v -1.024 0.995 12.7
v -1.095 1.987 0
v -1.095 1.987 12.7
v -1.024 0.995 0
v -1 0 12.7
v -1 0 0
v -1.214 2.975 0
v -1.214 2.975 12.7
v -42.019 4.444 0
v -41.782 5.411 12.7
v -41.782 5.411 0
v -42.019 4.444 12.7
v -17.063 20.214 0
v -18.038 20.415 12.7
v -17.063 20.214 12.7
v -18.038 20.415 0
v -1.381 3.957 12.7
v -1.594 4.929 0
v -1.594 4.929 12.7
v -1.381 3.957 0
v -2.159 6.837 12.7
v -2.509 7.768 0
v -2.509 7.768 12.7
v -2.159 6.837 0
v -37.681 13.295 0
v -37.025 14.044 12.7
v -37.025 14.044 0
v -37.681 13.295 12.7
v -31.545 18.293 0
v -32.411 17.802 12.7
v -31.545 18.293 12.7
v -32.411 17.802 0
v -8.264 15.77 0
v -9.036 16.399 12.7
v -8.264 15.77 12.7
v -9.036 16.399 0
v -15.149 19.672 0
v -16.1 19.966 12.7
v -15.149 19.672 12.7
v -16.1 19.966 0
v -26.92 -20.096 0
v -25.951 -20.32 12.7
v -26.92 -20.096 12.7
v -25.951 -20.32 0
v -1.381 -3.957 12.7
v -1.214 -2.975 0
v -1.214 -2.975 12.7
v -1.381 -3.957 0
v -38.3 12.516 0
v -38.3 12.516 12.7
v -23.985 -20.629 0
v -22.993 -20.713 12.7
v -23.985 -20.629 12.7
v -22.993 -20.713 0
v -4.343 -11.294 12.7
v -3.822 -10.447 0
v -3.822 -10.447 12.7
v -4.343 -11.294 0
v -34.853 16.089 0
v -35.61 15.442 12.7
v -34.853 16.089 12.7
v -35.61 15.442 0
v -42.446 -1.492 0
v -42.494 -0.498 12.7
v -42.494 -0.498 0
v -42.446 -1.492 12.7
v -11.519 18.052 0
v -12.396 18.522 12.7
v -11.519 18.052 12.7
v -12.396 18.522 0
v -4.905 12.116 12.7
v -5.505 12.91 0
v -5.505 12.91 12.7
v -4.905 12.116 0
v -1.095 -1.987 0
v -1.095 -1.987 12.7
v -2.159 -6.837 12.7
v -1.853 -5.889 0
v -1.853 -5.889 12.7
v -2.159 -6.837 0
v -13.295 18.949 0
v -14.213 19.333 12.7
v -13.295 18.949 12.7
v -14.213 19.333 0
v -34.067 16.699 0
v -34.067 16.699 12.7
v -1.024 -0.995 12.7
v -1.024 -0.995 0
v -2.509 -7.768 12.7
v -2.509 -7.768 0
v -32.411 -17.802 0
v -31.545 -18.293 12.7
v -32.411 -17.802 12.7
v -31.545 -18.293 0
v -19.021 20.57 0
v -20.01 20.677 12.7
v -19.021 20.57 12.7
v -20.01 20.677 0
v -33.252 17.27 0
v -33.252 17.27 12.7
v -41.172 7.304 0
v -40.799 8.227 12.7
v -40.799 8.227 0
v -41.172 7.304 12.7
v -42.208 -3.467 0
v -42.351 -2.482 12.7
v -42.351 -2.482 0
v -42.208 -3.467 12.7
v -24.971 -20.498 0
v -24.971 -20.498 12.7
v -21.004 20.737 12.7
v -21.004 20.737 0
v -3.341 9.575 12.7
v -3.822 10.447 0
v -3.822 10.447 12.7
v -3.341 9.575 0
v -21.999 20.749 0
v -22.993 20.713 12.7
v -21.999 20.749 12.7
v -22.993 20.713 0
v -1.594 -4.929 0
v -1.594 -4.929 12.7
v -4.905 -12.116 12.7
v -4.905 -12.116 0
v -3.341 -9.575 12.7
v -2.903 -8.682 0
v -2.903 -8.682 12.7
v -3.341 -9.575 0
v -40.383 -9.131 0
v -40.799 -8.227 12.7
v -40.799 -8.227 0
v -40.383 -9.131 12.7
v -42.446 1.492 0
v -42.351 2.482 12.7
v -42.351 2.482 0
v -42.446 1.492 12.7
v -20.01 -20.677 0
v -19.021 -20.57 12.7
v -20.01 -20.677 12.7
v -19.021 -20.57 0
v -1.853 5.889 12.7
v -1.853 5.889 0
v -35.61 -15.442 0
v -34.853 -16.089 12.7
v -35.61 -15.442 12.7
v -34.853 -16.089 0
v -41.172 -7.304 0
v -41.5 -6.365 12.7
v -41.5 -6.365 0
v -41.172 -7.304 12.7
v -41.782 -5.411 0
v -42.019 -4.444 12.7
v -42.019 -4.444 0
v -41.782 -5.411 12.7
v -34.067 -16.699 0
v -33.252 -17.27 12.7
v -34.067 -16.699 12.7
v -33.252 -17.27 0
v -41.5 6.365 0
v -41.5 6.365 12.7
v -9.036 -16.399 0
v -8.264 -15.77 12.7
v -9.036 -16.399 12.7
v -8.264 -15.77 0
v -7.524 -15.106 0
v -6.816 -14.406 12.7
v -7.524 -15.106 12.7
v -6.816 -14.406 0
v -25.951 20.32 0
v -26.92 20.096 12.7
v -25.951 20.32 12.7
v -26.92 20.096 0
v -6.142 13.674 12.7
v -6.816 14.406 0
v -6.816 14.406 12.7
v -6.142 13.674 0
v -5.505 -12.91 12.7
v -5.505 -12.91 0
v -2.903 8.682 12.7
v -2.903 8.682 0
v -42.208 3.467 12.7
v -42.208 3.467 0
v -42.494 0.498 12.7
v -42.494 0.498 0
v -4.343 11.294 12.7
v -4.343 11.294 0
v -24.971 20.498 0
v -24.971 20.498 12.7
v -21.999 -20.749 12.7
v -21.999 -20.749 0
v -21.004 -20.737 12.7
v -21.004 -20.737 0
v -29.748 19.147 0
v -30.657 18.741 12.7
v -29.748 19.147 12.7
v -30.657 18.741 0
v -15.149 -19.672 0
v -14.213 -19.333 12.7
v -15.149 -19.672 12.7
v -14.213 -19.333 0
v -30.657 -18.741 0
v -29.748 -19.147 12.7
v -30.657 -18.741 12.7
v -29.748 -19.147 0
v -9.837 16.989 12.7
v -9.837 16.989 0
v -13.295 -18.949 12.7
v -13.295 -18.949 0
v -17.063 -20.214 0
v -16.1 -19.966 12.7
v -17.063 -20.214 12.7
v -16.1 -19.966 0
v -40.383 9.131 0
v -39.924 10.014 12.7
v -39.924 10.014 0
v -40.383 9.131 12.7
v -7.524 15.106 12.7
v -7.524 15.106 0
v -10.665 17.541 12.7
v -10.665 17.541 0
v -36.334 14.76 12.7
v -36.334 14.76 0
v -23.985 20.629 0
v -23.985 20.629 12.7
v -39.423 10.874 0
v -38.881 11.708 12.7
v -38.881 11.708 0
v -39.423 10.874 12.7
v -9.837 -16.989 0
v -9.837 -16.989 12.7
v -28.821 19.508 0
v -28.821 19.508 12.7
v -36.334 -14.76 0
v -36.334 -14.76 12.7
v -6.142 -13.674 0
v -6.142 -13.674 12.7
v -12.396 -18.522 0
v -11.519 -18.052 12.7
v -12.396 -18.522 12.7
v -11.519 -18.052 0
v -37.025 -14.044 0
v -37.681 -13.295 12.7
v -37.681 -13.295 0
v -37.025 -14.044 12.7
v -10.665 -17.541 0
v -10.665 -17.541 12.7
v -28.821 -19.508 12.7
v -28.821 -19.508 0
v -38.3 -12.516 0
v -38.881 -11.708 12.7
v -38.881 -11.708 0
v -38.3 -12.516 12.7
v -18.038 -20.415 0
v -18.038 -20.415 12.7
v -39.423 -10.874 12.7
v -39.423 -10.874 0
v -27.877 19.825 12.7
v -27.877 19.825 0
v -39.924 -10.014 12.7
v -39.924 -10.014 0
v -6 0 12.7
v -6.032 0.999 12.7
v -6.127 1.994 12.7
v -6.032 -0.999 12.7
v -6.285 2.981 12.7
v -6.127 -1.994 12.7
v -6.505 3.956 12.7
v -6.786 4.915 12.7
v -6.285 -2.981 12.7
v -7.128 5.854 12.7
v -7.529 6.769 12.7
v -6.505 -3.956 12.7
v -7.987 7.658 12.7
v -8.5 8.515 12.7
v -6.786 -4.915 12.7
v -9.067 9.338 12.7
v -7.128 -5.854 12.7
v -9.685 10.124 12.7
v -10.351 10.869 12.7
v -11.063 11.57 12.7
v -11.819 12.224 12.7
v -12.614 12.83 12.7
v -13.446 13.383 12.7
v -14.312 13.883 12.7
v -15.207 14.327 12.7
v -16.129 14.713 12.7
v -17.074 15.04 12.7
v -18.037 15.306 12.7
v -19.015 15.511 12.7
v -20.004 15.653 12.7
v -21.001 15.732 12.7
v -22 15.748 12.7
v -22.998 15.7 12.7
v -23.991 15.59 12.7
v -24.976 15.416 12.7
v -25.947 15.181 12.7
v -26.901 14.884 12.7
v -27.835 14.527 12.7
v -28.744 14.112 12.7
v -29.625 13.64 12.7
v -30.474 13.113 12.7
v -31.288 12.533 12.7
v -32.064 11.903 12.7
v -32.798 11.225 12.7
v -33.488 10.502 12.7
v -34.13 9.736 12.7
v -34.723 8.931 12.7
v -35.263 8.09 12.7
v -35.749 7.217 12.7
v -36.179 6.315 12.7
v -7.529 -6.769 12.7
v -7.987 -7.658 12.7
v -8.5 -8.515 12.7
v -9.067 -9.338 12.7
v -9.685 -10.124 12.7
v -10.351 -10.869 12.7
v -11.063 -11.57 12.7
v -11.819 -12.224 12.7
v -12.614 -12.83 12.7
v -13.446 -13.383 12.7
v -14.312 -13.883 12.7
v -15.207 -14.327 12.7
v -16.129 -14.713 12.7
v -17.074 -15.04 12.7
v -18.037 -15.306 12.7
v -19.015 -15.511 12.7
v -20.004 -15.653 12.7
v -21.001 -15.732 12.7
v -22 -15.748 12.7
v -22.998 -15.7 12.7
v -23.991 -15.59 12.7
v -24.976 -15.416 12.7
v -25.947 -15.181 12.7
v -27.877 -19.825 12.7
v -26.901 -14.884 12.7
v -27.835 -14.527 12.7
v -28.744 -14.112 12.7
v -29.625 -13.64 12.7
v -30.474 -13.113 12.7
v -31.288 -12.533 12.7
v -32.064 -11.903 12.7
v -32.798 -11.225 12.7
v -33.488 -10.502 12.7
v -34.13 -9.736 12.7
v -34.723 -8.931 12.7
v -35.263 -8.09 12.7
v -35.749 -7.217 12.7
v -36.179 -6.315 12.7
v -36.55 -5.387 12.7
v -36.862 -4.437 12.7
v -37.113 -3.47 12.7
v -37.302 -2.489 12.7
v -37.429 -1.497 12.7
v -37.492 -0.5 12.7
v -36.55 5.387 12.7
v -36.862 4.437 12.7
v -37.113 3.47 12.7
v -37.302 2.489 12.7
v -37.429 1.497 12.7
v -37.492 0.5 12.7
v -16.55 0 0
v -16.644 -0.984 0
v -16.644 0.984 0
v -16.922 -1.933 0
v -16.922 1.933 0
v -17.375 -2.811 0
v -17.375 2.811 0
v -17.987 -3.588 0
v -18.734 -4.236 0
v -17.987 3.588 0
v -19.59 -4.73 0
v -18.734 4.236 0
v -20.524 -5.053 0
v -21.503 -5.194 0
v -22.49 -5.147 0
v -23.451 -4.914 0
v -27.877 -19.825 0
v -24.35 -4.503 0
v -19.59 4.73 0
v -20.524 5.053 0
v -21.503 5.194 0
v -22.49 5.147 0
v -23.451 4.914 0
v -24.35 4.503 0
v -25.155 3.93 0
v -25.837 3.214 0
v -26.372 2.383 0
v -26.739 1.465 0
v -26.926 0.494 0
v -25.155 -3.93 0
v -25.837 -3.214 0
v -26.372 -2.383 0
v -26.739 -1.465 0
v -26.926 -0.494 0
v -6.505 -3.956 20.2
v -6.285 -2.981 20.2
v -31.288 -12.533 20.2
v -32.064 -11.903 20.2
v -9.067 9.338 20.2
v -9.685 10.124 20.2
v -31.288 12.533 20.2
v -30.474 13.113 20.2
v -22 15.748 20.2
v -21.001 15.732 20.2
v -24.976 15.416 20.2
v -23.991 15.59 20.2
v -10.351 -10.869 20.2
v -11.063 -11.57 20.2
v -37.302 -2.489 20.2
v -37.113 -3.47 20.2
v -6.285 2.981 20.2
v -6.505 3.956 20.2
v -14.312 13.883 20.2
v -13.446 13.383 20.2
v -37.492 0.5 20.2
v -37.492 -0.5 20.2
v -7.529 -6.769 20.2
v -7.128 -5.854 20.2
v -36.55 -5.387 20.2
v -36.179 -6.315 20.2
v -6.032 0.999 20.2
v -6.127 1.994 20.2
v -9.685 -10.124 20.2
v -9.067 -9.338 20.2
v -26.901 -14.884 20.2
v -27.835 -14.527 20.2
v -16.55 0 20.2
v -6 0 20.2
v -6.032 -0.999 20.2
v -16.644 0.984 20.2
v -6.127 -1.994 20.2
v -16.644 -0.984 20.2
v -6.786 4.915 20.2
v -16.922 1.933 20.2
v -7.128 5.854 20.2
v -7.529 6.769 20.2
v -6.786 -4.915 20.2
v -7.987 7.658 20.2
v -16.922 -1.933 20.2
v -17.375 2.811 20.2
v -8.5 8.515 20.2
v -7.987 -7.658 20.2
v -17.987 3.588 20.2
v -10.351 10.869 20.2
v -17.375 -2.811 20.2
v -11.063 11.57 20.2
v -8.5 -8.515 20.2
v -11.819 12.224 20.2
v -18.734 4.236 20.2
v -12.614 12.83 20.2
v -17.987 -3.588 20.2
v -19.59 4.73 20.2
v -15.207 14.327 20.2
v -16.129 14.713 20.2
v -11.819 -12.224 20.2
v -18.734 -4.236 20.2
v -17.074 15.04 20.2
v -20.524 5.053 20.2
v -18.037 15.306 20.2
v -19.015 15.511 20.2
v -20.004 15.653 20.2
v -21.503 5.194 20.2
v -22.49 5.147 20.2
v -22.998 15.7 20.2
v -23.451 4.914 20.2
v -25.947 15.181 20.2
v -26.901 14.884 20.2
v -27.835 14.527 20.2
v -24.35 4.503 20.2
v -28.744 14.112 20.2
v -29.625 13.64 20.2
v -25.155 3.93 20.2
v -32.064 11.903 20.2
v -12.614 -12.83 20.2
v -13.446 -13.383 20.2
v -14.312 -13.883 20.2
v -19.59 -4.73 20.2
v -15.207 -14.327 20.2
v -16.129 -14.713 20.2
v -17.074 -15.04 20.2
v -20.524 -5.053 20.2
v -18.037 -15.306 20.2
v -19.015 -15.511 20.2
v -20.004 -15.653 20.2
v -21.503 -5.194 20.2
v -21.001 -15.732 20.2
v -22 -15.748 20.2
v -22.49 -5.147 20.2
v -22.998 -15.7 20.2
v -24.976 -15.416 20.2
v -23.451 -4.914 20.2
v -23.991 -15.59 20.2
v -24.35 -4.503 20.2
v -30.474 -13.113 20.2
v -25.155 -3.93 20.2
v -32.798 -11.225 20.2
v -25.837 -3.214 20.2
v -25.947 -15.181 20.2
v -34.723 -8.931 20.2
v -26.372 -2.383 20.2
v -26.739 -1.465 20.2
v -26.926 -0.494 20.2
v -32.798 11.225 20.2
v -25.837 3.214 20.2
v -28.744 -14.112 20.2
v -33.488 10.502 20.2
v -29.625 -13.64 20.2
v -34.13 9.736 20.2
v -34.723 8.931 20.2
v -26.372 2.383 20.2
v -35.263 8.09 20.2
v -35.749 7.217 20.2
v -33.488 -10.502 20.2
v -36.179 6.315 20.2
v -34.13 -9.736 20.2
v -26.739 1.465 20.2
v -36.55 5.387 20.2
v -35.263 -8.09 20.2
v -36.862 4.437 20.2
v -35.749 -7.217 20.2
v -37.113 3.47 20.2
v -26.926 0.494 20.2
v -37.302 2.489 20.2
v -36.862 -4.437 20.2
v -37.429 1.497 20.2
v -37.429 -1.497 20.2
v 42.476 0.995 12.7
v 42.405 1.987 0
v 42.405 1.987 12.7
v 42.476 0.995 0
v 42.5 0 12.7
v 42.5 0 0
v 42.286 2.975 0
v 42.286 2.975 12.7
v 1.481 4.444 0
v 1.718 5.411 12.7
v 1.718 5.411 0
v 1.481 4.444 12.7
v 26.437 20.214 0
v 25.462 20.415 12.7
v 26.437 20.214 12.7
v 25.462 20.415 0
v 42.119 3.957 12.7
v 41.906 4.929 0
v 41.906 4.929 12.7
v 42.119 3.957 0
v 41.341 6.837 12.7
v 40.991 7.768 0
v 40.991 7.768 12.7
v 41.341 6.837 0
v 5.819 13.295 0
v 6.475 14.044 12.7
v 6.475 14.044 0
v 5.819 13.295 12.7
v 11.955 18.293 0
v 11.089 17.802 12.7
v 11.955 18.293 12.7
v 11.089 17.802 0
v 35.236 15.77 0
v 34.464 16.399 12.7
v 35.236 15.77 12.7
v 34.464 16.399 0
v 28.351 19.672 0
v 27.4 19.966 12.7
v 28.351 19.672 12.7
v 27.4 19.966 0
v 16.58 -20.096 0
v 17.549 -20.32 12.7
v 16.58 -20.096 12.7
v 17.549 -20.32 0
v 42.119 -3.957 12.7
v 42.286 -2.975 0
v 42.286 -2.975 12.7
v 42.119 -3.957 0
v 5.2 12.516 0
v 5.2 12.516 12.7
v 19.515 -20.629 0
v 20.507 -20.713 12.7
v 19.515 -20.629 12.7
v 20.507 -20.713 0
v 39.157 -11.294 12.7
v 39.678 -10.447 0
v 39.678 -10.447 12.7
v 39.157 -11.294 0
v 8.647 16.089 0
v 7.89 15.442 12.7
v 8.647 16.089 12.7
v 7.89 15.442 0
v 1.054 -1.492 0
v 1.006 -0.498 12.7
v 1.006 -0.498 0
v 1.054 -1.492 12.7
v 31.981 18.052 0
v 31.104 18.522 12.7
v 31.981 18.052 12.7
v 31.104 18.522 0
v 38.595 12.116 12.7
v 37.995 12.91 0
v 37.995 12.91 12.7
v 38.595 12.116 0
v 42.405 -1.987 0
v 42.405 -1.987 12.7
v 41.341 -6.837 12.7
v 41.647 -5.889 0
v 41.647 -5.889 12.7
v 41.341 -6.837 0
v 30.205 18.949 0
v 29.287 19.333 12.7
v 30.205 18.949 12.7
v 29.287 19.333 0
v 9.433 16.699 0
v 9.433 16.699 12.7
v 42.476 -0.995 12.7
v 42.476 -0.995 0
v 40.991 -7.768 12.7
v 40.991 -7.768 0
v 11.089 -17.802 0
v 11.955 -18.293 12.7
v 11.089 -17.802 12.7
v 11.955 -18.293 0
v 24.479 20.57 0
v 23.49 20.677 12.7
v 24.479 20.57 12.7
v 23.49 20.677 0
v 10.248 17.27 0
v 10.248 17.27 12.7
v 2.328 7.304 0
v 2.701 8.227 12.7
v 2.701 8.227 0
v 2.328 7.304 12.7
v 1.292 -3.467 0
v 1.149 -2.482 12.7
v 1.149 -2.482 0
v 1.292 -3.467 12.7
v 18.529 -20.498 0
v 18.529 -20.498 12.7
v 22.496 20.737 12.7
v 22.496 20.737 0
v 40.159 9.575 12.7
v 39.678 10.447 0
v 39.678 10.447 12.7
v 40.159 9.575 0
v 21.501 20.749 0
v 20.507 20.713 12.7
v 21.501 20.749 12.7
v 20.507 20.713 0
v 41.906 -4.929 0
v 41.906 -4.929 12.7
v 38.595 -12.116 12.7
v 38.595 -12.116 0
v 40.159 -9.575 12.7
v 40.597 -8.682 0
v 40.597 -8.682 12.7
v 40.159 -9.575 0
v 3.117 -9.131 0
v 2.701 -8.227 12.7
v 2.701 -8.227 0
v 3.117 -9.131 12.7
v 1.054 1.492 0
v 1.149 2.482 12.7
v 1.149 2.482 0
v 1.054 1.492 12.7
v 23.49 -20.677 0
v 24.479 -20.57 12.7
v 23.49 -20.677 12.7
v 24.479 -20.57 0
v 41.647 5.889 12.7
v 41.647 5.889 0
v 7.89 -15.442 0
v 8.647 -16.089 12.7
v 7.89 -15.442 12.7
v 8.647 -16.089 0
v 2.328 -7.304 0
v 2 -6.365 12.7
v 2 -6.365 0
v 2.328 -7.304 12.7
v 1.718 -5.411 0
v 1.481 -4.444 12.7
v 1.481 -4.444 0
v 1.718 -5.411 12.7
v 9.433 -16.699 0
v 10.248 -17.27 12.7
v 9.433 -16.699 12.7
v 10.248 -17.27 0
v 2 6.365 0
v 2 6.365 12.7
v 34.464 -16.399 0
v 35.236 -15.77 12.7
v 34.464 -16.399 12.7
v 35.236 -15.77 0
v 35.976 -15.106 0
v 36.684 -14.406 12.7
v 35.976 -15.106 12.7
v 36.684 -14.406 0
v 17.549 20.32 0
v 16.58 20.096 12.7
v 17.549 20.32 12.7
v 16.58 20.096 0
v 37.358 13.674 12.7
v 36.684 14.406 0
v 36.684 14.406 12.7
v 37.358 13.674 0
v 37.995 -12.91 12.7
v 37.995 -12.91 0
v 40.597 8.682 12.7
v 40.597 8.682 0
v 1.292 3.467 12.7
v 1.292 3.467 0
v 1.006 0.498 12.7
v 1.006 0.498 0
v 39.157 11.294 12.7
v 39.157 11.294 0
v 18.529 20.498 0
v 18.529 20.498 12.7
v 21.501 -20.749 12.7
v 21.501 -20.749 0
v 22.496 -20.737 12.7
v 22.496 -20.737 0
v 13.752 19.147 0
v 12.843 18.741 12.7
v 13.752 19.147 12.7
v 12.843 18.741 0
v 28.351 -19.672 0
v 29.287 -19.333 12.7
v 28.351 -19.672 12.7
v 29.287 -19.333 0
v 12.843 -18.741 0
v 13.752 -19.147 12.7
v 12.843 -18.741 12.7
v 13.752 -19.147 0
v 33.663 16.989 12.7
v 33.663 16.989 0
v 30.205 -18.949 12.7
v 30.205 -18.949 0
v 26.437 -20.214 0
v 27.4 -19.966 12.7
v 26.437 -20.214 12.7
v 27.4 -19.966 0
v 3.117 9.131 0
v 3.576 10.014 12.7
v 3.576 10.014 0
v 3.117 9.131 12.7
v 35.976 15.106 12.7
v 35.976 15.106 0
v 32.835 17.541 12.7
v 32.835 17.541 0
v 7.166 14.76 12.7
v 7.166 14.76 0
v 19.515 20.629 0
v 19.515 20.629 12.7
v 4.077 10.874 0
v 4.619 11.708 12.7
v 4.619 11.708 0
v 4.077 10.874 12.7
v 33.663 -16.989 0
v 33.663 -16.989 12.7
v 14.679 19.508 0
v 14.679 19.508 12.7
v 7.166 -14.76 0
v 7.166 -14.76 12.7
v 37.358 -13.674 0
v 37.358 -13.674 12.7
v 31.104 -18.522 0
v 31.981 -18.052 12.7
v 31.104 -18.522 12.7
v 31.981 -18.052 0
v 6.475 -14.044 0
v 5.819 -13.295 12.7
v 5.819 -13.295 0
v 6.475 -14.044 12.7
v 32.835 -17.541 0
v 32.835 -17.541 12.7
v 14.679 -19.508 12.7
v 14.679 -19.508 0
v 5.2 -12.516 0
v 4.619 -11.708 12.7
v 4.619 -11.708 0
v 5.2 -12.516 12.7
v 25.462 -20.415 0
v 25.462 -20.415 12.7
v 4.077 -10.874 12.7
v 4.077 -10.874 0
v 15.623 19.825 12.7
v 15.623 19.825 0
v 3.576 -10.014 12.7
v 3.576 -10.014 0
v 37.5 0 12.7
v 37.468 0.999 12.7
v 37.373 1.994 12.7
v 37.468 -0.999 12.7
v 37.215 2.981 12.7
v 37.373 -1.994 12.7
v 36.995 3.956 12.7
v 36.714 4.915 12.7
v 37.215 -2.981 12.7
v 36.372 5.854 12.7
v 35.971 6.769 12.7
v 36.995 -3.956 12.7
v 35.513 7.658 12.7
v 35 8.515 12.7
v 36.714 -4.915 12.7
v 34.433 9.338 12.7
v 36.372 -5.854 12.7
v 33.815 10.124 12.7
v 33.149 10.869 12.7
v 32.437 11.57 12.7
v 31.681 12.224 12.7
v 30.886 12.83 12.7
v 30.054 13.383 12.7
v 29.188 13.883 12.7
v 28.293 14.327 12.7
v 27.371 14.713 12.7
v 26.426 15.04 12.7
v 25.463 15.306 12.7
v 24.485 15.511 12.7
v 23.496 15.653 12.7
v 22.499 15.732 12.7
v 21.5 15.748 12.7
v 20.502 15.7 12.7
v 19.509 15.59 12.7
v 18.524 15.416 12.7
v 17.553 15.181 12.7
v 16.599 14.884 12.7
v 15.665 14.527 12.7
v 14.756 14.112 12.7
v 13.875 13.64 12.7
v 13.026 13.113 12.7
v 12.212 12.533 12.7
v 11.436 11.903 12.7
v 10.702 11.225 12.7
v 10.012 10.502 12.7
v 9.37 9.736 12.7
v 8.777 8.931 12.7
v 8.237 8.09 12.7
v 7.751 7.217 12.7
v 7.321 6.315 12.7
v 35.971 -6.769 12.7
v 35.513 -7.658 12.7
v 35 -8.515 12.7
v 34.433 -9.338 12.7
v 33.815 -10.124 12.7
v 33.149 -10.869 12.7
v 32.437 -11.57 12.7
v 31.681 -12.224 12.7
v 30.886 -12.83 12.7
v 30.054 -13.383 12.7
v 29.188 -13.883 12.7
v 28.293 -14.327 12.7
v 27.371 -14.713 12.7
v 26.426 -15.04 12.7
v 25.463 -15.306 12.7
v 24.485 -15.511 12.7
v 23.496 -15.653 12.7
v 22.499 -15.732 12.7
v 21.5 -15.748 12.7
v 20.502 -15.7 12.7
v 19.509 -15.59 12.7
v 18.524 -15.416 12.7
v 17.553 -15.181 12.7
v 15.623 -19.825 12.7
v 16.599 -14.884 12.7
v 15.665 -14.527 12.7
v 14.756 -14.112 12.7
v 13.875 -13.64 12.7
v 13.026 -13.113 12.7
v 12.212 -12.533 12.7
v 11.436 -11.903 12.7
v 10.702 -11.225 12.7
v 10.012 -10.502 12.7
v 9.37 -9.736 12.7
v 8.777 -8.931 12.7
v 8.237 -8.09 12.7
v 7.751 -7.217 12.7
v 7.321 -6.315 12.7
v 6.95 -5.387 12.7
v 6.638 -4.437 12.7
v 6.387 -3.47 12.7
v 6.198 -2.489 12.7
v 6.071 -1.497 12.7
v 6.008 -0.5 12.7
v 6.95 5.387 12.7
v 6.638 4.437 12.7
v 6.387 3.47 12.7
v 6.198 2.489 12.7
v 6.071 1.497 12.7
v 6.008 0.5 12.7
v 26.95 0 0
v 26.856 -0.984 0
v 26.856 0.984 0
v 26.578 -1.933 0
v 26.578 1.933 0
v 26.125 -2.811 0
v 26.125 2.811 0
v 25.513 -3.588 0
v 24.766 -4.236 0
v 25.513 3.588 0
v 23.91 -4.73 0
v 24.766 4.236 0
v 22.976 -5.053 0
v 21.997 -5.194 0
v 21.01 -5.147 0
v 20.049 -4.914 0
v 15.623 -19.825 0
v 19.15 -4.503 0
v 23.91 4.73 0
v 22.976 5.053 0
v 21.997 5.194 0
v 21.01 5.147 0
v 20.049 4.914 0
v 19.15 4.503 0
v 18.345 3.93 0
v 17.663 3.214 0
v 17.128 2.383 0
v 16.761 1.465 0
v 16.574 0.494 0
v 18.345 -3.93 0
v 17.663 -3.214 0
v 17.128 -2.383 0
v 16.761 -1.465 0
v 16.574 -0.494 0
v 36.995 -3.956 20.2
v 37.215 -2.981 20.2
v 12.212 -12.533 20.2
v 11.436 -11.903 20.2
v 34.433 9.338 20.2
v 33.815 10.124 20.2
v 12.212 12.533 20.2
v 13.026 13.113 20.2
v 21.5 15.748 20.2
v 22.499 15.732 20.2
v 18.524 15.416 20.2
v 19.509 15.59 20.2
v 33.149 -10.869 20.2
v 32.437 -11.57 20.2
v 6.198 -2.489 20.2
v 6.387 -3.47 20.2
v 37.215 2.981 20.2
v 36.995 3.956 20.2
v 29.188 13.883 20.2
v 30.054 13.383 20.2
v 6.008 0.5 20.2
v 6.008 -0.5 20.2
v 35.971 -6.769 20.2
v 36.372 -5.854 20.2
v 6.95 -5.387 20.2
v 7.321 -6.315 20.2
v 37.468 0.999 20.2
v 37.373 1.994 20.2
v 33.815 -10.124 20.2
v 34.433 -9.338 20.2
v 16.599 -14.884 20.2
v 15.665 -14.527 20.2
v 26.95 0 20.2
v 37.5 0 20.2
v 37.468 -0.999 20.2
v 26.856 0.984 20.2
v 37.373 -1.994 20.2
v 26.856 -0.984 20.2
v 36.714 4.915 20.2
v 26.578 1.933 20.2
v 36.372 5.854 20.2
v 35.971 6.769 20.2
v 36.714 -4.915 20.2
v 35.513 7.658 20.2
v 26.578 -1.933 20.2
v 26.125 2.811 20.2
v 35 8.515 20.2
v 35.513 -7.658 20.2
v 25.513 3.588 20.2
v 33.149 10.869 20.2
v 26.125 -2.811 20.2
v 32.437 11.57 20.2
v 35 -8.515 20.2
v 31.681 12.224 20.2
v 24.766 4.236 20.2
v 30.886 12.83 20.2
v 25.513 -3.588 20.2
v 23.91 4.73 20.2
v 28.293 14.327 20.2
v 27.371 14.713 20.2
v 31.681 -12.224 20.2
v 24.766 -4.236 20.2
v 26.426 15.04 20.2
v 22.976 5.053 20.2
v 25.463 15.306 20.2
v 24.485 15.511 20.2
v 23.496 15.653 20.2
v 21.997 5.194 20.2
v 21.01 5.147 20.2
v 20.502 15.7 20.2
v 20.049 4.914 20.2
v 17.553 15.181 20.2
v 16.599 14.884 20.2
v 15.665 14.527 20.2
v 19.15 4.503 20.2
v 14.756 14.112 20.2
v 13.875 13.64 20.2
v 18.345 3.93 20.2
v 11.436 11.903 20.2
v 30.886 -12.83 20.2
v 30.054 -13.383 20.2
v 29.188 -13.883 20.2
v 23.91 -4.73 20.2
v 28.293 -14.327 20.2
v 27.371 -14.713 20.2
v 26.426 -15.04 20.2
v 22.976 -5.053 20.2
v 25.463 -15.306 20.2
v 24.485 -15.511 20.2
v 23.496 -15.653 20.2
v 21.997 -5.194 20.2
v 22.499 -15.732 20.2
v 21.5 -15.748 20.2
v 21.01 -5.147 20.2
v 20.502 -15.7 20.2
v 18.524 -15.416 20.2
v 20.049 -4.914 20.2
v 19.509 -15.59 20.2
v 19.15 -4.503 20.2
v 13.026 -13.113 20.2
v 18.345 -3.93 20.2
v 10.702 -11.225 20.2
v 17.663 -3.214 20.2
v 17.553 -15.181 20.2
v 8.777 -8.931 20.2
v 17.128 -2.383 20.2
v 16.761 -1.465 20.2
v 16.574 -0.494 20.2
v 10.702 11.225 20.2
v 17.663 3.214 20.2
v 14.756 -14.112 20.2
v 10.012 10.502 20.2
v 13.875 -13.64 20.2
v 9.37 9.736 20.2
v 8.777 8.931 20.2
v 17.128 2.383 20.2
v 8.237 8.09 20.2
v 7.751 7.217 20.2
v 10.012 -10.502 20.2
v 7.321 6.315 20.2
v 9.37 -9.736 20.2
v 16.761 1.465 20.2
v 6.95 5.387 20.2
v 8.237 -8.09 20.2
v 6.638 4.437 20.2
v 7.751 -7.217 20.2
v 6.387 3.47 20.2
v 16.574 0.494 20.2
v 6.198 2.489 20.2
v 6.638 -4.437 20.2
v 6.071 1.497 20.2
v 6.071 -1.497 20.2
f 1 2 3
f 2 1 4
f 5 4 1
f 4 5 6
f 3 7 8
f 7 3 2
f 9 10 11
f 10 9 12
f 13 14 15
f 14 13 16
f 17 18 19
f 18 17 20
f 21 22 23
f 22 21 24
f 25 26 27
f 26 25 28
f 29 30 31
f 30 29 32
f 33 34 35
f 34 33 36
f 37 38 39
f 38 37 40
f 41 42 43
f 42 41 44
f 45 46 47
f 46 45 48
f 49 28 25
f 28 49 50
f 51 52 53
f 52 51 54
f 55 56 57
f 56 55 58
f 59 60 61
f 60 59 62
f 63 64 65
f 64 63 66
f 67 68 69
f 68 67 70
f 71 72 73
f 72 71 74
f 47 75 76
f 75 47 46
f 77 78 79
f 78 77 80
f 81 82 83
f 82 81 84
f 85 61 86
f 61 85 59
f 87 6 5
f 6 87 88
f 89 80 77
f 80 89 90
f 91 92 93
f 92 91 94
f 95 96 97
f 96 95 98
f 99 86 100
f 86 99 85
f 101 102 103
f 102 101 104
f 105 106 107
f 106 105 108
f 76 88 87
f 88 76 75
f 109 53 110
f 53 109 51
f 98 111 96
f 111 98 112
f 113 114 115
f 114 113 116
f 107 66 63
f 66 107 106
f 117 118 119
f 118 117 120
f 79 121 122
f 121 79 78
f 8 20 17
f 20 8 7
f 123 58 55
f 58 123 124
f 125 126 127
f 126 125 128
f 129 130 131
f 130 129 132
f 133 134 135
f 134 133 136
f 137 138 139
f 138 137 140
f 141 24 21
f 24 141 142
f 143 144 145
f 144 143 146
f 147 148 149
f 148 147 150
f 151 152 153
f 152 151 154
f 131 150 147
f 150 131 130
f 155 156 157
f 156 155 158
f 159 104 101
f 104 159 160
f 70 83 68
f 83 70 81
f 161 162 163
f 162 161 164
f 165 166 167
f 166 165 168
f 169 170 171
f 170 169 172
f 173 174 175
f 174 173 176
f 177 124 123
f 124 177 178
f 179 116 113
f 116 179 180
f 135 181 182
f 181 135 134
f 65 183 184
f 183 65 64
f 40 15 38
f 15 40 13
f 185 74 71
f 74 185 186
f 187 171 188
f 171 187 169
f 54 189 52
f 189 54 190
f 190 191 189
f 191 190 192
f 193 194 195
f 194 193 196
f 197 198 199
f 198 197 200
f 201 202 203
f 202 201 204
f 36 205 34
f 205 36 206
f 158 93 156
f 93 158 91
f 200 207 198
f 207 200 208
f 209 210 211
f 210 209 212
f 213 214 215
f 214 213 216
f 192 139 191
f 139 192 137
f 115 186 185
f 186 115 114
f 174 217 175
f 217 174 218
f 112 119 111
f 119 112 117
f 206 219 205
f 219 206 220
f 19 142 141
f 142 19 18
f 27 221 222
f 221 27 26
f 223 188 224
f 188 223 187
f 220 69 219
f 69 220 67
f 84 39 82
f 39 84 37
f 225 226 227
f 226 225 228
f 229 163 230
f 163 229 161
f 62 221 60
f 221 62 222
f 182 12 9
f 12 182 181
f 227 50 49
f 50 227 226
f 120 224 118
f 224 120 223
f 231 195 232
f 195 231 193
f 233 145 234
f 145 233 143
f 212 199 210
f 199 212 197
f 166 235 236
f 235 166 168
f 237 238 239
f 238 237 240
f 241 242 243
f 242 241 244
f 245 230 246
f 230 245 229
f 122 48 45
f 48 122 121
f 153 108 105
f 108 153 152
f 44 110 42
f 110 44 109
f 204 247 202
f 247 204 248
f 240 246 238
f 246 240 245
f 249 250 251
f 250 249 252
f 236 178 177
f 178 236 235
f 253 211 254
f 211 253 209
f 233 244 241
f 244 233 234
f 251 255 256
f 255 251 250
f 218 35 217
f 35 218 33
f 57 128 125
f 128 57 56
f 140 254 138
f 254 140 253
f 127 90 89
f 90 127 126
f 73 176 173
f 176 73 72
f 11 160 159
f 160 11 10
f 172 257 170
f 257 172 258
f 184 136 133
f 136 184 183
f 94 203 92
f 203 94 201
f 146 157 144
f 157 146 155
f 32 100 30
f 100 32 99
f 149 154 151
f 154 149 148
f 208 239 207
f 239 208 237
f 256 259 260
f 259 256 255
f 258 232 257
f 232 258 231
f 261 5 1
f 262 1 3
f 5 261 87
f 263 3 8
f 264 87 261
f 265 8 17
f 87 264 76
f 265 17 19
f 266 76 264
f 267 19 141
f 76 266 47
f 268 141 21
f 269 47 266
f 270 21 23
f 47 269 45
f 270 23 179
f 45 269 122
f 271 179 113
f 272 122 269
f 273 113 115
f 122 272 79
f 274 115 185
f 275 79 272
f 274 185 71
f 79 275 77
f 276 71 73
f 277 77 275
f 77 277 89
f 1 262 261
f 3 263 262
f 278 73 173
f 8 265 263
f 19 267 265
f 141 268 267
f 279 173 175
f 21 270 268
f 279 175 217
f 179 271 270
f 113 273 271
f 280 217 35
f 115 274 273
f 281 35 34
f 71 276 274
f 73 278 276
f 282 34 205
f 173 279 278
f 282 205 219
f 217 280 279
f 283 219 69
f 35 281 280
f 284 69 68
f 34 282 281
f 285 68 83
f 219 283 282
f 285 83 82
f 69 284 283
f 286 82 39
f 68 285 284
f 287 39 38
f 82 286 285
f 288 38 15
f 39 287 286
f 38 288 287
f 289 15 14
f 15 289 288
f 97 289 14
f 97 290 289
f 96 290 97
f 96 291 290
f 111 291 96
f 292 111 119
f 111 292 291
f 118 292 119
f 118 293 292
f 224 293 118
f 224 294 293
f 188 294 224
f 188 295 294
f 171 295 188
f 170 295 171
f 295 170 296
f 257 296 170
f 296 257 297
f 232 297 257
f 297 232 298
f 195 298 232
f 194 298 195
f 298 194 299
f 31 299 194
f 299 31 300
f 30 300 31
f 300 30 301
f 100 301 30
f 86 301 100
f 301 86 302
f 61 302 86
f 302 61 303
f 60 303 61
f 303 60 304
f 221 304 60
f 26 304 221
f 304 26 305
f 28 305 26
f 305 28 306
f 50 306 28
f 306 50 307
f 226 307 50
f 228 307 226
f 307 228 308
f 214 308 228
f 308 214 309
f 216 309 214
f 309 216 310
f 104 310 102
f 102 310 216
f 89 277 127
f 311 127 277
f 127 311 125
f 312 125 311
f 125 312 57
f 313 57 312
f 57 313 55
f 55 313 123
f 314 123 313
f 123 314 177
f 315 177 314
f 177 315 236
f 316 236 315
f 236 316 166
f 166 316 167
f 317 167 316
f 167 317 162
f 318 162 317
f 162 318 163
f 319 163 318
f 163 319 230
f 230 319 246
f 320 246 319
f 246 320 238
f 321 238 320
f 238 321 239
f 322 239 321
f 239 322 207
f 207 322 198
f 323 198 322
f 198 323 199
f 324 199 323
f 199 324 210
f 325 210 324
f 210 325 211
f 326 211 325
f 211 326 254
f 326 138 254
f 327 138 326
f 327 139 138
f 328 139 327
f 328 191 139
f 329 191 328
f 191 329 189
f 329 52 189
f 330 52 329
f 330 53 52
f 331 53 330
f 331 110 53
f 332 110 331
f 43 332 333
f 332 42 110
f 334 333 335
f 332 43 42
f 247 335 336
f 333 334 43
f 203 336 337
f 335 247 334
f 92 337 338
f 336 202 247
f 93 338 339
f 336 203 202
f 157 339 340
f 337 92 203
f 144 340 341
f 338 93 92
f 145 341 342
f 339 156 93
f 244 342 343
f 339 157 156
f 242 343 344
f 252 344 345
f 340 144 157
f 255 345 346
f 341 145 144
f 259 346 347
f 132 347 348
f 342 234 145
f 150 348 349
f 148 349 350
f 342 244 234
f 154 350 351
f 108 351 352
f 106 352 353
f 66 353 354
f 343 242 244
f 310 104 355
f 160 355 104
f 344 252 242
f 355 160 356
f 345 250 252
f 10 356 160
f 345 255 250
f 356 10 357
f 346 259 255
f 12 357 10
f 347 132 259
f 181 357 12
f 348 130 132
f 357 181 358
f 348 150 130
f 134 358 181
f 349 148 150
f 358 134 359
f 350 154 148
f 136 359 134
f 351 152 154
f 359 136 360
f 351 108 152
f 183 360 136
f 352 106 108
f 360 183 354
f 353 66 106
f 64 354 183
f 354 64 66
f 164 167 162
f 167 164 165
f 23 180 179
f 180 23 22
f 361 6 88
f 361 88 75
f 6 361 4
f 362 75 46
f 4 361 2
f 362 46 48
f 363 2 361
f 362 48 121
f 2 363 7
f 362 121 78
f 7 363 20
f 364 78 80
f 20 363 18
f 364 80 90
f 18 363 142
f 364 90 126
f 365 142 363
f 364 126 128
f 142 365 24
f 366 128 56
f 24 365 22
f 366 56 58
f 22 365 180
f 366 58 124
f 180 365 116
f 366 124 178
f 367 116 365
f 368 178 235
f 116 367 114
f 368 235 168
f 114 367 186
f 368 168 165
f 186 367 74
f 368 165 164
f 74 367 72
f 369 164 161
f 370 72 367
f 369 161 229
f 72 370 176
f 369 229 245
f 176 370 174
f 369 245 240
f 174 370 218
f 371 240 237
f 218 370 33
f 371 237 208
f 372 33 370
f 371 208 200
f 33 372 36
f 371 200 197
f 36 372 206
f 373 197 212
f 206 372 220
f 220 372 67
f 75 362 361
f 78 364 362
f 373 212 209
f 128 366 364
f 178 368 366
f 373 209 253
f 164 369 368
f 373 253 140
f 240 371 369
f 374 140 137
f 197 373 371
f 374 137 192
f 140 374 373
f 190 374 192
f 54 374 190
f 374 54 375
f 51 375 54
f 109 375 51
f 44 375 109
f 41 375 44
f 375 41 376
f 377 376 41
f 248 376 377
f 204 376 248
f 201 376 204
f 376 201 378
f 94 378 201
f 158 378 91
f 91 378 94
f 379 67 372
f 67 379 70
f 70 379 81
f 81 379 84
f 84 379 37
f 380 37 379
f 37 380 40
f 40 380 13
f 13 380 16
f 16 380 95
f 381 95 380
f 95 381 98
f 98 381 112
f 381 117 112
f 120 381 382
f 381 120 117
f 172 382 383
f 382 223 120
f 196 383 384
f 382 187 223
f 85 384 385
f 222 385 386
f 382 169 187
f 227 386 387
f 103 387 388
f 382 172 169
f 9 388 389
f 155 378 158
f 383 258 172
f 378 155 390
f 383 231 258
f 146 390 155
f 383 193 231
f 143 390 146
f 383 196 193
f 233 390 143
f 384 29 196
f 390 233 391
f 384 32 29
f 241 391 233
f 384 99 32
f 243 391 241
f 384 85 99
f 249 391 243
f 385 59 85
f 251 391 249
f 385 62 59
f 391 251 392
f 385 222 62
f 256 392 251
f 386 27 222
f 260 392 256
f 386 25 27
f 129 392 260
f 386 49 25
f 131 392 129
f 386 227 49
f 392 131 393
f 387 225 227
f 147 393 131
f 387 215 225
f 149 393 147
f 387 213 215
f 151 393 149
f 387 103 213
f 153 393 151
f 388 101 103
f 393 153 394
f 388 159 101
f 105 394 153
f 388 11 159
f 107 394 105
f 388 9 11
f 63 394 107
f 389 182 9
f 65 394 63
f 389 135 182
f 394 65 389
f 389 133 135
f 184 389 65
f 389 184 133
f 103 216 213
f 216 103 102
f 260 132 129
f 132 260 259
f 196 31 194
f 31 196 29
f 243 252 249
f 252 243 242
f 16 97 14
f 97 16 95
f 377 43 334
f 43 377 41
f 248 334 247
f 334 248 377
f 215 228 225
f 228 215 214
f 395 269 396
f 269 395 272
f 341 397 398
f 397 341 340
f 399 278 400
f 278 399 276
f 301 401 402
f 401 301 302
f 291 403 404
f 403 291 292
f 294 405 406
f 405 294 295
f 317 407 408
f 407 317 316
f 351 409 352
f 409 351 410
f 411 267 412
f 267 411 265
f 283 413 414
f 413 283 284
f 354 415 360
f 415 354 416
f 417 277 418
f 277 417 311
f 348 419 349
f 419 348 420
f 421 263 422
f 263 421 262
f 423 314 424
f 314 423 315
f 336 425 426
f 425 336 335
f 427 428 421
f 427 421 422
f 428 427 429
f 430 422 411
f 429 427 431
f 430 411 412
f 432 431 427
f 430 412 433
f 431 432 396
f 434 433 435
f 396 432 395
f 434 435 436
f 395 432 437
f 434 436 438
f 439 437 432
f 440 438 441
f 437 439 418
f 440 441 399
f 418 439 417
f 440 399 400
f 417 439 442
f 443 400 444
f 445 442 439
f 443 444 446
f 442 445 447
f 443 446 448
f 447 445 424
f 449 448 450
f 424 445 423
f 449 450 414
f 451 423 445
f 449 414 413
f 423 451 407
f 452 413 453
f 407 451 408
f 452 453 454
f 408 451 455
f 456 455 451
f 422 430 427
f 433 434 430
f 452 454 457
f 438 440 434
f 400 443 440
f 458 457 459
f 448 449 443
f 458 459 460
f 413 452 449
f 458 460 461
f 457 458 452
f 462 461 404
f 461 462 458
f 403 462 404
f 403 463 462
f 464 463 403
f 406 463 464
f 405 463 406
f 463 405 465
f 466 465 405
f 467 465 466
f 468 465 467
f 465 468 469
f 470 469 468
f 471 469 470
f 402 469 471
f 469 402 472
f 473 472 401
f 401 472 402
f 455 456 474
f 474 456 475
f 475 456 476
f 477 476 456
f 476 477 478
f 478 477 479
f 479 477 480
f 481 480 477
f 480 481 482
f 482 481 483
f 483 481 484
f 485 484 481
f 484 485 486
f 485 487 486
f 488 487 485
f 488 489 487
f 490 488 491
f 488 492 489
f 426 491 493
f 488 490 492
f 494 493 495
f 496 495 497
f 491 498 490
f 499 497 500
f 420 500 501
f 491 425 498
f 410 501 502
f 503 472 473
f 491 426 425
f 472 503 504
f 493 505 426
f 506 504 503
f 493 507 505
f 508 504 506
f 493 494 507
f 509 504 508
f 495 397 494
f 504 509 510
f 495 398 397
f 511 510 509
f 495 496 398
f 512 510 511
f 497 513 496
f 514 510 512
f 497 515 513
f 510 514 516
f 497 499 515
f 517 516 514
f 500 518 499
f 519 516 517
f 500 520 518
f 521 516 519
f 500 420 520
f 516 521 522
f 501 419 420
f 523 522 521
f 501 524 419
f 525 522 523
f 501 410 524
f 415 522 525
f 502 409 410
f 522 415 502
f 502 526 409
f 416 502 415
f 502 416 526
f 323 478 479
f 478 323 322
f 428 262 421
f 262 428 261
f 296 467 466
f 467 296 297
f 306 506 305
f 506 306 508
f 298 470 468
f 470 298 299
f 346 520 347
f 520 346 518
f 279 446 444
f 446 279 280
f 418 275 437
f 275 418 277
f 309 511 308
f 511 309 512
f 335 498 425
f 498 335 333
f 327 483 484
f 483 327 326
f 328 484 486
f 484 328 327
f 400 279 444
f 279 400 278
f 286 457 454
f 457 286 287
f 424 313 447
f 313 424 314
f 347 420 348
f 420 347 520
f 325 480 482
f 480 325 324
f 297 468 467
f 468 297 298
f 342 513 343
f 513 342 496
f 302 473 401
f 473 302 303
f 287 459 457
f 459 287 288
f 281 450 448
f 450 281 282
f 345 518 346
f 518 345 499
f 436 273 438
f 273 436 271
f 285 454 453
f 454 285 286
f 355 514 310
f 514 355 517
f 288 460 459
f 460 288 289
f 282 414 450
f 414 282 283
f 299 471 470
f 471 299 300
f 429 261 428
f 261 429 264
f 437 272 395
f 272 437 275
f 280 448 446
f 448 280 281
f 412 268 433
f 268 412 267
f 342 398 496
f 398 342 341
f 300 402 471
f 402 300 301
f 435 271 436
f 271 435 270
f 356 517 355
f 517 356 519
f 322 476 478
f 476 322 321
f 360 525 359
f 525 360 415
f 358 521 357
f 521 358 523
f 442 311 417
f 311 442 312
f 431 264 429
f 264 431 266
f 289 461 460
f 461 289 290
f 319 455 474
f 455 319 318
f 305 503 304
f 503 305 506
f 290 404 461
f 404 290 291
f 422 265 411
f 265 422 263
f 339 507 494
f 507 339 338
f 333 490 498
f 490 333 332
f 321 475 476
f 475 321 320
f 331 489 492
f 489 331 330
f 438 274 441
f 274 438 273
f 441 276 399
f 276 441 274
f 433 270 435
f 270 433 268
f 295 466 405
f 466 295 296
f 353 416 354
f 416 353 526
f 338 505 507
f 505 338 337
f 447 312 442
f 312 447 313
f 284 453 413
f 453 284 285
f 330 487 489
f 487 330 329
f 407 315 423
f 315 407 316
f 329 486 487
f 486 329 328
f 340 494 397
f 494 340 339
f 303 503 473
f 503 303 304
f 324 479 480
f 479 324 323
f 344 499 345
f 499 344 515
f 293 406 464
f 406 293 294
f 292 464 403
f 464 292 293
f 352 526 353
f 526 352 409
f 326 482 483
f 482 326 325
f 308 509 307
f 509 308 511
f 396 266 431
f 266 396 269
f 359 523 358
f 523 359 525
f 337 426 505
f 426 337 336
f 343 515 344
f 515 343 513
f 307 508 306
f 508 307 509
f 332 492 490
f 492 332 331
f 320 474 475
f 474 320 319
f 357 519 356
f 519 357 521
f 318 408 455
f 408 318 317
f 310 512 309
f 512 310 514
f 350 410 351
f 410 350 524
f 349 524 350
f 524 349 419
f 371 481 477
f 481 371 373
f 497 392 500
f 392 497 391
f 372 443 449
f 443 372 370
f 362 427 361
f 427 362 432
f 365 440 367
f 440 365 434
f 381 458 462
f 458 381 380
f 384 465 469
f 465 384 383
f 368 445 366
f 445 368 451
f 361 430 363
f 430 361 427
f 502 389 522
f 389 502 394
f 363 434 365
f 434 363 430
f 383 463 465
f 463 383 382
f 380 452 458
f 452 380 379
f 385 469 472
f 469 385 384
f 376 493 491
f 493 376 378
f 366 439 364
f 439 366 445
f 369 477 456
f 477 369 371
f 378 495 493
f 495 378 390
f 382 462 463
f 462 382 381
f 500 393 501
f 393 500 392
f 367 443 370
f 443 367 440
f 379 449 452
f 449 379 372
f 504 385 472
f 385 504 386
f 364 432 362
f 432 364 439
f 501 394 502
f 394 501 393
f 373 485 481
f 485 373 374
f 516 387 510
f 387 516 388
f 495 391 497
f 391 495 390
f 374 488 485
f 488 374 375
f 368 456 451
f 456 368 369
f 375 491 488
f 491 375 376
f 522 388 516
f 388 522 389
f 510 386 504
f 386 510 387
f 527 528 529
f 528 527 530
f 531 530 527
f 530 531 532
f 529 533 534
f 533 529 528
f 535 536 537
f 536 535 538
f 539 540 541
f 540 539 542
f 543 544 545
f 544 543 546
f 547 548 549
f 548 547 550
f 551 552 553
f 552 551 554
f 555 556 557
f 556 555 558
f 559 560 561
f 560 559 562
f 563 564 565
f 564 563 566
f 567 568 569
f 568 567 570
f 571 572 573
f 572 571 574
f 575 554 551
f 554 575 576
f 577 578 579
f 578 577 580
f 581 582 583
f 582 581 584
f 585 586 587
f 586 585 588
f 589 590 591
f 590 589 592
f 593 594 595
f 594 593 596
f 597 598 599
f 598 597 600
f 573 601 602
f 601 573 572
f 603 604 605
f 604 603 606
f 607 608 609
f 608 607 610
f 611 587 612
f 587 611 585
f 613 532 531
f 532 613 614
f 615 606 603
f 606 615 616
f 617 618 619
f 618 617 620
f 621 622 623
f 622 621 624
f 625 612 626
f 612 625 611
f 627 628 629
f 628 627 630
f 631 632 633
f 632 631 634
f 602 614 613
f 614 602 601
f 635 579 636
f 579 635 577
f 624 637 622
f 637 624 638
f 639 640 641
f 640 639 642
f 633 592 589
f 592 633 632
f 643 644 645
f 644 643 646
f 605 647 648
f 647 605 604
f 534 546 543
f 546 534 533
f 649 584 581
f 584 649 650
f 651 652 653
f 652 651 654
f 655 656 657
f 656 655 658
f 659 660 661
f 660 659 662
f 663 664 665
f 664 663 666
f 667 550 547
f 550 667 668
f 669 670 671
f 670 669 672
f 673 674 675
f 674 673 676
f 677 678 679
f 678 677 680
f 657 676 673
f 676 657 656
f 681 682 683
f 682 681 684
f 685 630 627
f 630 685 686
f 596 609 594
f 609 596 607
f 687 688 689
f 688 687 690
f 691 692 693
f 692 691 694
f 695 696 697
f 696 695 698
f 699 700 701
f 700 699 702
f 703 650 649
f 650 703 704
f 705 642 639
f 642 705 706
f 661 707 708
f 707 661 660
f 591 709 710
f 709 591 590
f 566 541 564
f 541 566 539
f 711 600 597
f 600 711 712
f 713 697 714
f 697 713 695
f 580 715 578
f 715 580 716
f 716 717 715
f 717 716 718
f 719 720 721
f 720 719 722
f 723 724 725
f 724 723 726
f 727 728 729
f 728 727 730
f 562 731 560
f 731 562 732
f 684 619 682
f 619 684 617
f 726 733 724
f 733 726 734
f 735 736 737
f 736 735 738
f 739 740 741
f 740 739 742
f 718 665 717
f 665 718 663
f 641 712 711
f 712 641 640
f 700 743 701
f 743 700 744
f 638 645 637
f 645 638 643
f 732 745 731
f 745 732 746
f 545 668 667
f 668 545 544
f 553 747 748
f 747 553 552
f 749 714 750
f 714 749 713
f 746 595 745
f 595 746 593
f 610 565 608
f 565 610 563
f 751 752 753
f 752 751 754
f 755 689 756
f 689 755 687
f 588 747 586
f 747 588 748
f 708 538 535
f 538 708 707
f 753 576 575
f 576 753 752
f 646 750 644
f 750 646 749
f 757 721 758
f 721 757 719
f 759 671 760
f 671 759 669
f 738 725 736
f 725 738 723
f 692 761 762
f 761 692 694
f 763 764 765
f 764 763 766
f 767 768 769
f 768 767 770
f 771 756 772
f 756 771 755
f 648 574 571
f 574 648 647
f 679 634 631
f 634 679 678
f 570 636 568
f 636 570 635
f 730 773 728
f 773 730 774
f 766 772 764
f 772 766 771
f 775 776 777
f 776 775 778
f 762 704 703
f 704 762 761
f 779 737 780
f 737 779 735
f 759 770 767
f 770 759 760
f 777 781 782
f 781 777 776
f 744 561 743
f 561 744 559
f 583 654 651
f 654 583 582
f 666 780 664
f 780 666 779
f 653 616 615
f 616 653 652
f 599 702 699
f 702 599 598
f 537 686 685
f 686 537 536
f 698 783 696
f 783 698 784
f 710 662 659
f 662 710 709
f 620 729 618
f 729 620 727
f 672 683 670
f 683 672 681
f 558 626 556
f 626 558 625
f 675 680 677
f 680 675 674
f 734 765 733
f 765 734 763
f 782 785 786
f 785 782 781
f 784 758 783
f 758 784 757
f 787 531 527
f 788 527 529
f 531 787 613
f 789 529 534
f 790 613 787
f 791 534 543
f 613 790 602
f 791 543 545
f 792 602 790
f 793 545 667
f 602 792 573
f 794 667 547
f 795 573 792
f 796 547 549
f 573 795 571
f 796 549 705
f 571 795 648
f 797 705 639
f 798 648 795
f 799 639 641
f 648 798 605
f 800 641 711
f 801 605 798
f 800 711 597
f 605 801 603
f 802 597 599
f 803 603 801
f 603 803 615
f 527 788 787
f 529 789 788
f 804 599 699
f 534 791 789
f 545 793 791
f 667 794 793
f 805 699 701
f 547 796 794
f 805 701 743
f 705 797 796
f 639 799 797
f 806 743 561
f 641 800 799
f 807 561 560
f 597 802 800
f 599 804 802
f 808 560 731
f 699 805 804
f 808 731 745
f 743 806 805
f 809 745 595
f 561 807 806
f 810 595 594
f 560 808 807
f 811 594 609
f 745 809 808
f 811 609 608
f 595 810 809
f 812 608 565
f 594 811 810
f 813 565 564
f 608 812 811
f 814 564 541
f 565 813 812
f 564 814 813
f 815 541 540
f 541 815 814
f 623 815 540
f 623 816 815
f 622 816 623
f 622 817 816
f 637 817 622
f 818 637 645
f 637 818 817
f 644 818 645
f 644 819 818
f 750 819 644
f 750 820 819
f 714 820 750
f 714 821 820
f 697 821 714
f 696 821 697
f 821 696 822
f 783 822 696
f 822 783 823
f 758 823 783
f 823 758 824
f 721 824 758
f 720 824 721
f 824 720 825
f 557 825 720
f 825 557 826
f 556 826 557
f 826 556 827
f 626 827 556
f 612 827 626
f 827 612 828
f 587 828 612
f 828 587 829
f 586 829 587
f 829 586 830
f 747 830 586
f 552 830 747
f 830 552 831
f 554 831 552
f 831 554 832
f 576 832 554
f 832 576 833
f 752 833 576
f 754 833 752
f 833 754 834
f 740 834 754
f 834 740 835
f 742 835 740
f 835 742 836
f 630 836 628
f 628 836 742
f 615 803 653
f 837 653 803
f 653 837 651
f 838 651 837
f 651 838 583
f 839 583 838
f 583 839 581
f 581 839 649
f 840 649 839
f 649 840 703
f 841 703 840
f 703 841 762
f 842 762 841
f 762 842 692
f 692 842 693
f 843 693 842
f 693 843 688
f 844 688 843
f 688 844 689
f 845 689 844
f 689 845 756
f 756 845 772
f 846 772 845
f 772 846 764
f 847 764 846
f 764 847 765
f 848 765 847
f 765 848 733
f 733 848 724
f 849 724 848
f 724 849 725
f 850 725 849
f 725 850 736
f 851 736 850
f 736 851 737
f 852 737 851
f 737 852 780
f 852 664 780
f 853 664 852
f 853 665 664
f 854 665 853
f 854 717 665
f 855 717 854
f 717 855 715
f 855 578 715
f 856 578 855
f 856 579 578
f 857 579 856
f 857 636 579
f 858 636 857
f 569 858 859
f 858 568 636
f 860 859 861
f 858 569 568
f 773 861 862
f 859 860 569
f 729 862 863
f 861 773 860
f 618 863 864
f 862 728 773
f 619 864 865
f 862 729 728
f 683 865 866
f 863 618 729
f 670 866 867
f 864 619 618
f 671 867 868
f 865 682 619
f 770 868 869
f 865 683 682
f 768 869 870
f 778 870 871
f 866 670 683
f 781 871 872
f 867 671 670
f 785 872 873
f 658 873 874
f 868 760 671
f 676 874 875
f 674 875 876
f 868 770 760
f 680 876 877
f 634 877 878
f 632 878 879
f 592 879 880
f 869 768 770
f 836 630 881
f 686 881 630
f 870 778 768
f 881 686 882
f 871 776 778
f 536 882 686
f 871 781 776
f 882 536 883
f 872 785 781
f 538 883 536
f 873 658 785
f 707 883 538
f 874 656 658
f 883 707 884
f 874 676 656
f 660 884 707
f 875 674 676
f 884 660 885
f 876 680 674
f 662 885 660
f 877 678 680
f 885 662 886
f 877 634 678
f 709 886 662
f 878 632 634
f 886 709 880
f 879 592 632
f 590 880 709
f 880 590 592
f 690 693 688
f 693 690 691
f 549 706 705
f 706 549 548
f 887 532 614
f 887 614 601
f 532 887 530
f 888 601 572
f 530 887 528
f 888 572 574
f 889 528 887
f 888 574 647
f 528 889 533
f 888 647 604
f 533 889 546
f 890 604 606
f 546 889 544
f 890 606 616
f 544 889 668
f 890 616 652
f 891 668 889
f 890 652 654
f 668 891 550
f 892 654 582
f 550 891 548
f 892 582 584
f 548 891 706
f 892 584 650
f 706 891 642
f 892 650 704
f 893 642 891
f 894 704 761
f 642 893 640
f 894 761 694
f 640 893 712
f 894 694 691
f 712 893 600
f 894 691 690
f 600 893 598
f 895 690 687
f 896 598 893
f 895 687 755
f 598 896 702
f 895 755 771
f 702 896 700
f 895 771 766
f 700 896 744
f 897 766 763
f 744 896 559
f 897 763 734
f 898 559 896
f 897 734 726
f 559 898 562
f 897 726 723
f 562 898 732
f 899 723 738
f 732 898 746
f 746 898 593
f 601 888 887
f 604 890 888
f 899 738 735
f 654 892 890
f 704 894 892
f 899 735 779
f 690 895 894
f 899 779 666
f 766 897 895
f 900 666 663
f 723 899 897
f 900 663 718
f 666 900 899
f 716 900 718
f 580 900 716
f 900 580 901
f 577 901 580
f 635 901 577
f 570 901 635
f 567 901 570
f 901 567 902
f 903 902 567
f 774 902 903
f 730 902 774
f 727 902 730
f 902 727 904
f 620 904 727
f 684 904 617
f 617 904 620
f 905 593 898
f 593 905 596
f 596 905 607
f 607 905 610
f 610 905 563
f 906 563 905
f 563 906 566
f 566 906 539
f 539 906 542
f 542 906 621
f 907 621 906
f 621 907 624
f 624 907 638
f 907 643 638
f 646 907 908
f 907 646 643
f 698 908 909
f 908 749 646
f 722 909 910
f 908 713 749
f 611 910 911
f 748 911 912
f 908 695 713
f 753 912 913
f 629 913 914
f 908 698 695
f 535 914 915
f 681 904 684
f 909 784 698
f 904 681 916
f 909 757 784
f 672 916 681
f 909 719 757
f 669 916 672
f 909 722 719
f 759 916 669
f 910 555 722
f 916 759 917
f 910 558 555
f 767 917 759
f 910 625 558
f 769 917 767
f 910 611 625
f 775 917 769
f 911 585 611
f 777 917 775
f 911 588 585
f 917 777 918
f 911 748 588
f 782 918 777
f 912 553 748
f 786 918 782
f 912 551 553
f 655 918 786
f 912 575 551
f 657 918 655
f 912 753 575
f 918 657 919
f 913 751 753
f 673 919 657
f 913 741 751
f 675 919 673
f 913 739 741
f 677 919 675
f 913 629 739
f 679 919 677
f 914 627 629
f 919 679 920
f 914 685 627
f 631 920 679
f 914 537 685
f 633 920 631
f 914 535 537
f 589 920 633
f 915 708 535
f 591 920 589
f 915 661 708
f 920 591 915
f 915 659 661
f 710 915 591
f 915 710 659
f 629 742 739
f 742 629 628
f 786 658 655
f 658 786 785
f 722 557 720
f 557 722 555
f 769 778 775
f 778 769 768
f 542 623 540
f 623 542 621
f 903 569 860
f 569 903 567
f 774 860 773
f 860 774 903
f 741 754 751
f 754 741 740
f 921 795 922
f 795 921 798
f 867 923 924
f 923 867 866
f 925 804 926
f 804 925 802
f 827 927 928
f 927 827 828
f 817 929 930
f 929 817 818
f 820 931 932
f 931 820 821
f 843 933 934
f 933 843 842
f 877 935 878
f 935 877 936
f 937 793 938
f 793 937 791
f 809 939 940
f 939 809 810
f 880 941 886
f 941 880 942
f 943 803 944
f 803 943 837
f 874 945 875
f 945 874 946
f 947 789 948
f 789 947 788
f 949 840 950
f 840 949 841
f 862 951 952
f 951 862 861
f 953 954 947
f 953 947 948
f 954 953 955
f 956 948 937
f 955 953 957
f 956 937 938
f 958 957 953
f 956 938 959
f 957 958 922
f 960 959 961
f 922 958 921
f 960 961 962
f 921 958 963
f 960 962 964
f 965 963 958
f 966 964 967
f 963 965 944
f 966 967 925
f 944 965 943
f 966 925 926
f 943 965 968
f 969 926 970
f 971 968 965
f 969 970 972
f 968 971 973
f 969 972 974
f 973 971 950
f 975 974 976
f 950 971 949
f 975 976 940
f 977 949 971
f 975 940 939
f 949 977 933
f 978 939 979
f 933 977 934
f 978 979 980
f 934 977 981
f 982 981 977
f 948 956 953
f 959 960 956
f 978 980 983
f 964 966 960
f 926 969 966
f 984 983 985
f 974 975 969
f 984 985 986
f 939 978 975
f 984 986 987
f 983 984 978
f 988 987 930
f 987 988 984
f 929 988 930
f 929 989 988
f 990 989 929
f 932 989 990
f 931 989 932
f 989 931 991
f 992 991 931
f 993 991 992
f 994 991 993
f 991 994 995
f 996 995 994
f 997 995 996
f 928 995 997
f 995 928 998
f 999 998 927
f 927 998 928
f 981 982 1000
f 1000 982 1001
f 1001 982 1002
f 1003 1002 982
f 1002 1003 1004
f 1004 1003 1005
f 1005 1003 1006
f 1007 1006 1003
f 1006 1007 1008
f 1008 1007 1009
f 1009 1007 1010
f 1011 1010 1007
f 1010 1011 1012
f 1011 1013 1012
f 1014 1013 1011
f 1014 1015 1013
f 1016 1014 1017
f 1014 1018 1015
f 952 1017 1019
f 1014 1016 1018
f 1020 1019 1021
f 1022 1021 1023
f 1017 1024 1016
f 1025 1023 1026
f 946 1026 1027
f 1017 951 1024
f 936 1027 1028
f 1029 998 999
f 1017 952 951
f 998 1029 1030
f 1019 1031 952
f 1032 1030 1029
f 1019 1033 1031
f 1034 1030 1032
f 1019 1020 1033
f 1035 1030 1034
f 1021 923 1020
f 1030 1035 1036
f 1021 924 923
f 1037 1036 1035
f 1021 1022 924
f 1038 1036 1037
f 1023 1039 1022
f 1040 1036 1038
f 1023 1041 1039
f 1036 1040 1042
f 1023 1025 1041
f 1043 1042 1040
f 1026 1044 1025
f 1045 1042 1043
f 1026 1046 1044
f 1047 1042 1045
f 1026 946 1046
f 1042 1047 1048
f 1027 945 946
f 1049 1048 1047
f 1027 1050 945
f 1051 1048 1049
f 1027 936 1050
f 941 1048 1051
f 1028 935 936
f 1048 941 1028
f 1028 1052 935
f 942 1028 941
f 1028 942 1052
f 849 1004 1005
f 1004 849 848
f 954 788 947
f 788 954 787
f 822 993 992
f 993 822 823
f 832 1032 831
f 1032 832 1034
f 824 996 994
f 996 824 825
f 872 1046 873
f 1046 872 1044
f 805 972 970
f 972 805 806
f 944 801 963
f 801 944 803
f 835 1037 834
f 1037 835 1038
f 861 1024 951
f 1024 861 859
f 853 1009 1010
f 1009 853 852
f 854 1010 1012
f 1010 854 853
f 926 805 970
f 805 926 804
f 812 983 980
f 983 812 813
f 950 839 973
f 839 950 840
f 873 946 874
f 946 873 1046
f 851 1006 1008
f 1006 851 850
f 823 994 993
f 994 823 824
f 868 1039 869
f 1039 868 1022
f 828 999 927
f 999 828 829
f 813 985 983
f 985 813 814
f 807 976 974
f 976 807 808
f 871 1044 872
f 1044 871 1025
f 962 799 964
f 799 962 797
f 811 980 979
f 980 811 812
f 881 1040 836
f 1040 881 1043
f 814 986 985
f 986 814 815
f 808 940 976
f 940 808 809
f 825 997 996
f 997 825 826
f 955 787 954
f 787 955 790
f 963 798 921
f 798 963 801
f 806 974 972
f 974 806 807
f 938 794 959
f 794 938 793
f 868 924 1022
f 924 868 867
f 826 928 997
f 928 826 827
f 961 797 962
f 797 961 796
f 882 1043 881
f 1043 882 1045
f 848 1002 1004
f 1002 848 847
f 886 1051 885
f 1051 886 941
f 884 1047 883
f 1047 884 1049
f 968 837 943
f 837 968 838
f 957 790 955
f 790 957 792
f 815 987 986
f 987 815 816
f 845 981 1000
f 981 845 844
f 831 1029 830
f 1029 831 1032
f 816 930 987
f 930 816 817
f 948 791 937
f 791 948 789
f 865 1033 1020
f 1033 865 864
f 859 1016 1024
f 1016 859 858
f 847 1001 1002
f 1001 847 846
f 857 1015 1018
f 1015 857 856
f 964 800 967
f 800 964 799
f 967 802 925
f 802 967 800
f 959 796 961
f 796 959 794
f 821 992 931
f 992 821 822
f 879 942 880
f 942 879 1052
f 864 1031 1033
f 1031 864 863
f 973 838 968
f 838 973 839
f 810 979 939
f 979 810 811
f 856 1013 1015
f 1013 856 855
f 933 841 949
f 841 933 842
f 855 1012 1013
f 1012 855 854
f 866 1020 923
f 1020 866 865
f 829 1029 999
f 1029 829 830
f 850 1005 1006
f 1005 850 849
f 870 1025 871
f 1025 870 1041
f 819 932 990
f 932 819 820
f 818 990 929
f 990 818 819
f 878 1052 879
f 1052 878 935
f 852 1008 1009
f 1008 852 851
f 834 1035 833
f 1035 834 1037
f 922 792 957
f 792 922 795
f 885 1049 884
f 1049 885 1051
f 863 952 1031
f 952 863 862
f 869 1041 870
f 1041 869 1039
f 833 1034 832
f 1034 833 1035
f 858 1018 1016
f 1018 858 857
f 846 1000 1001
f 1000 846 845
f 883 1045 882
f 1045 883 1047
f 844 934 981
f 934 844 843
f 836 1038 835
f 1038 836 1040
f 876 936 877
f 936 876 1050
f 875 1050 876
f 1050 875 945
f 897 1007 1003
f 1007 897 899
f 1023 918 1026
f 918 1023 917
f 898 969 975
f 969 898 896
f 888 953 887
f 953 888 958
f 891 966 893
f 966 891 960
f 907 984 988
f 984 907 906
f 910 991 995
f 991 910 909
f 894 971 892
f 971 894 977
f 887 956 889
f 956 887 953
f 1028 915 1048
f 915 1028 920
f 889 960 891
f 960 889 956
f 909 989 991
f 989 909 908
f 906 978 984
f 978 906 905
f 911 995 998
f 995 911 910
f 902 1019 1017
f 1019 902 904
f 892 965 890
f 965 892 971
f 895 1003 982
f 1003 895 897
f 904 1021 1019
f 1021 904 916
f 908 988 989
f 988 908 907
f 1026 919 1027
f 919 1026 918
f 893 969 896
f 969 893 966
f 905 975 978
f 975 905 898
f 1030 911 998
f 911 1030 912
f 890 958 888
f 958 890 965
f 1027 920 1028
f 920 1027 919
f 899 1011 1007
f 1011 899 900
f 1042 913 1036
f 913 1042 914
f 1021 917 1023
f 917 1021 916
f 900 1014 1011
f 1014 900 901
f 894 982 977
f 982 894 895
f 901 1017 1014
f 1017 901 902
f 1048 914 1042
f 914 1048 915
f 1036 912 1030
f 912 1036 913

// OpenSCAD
//design and code by emanresu (http://www.thingiverse.com/Emanresu)
//Generates two symmetric spool bearings/axel adapters/what have you
//spacer can be used to center the spool on a specific axel,
//or to simply keep the bearing/axel adapter from sliding into the spool


//CUSTOMIZER VARIABLES


//diameter of spool hole (mm)
spool_hole_diameter=31.5;

//distance bearing sticks into spool hole (mm)
spool_hole_depth=15;

//diameter of the axle (mm)
axel_diameter=10.4;

//height of spacer (mm) (useful for centering a spool) 
spacer=12.7;
//e.g. 0 = no spacer; 10 = a 10mm extension of a wider diameter

//extra diameter of spacer (mm)
spacer_diameter=10;
//(e.g. 0 = spool_hole_diameter; 10 = spool_hole_diameter + 10)

//closest distance between bearings on platform (mm)
separation=2;

/* [Hidden] */

//set openSCAD resolution
$fa=1;
$fs=1;


  //////////////////
 // Control Code //
//////////////////

//Right bearing
translate([-spool_hole_diameter/2-5-separation/2, 0, 0]) {
	difference() {
		union() {
			//spacer/end cap
			cylinder(r=spool_hole_diameter/2+5, h=spacer, center=false);
			//spool contact
			translate([0, 0, spacer]) cylinder(r=spool_hole_diameter/2, h=spool_hole_depth/2, center=false);
		}
		//axel hole
		translate([0, 0, -1]) cylinder(r=axel_diameter/2, h=(spacer+spool_hole_depth/2+2), center=false);
	}
}

//Left bearing
translate([spool_hole_diameter/2+5+separation/2, 0, 0]) {
	difference() {
		union() {
			//spacer/end cap
			cylinder(r=spool_hole_diameter/2+5, h=spacer, center=false);
			//spool contact
			translate([0, 0, spacer]) cylinder(r=spool_hole_diameter/2, h=spool_hole_depth/2, center=false);
		}
		//axel hole
		translate([0, 0, -1]) cylinder(r=axel_diameter/2, h=(spacer+spool_hole_depth/2+2), center=false);
	}
}
